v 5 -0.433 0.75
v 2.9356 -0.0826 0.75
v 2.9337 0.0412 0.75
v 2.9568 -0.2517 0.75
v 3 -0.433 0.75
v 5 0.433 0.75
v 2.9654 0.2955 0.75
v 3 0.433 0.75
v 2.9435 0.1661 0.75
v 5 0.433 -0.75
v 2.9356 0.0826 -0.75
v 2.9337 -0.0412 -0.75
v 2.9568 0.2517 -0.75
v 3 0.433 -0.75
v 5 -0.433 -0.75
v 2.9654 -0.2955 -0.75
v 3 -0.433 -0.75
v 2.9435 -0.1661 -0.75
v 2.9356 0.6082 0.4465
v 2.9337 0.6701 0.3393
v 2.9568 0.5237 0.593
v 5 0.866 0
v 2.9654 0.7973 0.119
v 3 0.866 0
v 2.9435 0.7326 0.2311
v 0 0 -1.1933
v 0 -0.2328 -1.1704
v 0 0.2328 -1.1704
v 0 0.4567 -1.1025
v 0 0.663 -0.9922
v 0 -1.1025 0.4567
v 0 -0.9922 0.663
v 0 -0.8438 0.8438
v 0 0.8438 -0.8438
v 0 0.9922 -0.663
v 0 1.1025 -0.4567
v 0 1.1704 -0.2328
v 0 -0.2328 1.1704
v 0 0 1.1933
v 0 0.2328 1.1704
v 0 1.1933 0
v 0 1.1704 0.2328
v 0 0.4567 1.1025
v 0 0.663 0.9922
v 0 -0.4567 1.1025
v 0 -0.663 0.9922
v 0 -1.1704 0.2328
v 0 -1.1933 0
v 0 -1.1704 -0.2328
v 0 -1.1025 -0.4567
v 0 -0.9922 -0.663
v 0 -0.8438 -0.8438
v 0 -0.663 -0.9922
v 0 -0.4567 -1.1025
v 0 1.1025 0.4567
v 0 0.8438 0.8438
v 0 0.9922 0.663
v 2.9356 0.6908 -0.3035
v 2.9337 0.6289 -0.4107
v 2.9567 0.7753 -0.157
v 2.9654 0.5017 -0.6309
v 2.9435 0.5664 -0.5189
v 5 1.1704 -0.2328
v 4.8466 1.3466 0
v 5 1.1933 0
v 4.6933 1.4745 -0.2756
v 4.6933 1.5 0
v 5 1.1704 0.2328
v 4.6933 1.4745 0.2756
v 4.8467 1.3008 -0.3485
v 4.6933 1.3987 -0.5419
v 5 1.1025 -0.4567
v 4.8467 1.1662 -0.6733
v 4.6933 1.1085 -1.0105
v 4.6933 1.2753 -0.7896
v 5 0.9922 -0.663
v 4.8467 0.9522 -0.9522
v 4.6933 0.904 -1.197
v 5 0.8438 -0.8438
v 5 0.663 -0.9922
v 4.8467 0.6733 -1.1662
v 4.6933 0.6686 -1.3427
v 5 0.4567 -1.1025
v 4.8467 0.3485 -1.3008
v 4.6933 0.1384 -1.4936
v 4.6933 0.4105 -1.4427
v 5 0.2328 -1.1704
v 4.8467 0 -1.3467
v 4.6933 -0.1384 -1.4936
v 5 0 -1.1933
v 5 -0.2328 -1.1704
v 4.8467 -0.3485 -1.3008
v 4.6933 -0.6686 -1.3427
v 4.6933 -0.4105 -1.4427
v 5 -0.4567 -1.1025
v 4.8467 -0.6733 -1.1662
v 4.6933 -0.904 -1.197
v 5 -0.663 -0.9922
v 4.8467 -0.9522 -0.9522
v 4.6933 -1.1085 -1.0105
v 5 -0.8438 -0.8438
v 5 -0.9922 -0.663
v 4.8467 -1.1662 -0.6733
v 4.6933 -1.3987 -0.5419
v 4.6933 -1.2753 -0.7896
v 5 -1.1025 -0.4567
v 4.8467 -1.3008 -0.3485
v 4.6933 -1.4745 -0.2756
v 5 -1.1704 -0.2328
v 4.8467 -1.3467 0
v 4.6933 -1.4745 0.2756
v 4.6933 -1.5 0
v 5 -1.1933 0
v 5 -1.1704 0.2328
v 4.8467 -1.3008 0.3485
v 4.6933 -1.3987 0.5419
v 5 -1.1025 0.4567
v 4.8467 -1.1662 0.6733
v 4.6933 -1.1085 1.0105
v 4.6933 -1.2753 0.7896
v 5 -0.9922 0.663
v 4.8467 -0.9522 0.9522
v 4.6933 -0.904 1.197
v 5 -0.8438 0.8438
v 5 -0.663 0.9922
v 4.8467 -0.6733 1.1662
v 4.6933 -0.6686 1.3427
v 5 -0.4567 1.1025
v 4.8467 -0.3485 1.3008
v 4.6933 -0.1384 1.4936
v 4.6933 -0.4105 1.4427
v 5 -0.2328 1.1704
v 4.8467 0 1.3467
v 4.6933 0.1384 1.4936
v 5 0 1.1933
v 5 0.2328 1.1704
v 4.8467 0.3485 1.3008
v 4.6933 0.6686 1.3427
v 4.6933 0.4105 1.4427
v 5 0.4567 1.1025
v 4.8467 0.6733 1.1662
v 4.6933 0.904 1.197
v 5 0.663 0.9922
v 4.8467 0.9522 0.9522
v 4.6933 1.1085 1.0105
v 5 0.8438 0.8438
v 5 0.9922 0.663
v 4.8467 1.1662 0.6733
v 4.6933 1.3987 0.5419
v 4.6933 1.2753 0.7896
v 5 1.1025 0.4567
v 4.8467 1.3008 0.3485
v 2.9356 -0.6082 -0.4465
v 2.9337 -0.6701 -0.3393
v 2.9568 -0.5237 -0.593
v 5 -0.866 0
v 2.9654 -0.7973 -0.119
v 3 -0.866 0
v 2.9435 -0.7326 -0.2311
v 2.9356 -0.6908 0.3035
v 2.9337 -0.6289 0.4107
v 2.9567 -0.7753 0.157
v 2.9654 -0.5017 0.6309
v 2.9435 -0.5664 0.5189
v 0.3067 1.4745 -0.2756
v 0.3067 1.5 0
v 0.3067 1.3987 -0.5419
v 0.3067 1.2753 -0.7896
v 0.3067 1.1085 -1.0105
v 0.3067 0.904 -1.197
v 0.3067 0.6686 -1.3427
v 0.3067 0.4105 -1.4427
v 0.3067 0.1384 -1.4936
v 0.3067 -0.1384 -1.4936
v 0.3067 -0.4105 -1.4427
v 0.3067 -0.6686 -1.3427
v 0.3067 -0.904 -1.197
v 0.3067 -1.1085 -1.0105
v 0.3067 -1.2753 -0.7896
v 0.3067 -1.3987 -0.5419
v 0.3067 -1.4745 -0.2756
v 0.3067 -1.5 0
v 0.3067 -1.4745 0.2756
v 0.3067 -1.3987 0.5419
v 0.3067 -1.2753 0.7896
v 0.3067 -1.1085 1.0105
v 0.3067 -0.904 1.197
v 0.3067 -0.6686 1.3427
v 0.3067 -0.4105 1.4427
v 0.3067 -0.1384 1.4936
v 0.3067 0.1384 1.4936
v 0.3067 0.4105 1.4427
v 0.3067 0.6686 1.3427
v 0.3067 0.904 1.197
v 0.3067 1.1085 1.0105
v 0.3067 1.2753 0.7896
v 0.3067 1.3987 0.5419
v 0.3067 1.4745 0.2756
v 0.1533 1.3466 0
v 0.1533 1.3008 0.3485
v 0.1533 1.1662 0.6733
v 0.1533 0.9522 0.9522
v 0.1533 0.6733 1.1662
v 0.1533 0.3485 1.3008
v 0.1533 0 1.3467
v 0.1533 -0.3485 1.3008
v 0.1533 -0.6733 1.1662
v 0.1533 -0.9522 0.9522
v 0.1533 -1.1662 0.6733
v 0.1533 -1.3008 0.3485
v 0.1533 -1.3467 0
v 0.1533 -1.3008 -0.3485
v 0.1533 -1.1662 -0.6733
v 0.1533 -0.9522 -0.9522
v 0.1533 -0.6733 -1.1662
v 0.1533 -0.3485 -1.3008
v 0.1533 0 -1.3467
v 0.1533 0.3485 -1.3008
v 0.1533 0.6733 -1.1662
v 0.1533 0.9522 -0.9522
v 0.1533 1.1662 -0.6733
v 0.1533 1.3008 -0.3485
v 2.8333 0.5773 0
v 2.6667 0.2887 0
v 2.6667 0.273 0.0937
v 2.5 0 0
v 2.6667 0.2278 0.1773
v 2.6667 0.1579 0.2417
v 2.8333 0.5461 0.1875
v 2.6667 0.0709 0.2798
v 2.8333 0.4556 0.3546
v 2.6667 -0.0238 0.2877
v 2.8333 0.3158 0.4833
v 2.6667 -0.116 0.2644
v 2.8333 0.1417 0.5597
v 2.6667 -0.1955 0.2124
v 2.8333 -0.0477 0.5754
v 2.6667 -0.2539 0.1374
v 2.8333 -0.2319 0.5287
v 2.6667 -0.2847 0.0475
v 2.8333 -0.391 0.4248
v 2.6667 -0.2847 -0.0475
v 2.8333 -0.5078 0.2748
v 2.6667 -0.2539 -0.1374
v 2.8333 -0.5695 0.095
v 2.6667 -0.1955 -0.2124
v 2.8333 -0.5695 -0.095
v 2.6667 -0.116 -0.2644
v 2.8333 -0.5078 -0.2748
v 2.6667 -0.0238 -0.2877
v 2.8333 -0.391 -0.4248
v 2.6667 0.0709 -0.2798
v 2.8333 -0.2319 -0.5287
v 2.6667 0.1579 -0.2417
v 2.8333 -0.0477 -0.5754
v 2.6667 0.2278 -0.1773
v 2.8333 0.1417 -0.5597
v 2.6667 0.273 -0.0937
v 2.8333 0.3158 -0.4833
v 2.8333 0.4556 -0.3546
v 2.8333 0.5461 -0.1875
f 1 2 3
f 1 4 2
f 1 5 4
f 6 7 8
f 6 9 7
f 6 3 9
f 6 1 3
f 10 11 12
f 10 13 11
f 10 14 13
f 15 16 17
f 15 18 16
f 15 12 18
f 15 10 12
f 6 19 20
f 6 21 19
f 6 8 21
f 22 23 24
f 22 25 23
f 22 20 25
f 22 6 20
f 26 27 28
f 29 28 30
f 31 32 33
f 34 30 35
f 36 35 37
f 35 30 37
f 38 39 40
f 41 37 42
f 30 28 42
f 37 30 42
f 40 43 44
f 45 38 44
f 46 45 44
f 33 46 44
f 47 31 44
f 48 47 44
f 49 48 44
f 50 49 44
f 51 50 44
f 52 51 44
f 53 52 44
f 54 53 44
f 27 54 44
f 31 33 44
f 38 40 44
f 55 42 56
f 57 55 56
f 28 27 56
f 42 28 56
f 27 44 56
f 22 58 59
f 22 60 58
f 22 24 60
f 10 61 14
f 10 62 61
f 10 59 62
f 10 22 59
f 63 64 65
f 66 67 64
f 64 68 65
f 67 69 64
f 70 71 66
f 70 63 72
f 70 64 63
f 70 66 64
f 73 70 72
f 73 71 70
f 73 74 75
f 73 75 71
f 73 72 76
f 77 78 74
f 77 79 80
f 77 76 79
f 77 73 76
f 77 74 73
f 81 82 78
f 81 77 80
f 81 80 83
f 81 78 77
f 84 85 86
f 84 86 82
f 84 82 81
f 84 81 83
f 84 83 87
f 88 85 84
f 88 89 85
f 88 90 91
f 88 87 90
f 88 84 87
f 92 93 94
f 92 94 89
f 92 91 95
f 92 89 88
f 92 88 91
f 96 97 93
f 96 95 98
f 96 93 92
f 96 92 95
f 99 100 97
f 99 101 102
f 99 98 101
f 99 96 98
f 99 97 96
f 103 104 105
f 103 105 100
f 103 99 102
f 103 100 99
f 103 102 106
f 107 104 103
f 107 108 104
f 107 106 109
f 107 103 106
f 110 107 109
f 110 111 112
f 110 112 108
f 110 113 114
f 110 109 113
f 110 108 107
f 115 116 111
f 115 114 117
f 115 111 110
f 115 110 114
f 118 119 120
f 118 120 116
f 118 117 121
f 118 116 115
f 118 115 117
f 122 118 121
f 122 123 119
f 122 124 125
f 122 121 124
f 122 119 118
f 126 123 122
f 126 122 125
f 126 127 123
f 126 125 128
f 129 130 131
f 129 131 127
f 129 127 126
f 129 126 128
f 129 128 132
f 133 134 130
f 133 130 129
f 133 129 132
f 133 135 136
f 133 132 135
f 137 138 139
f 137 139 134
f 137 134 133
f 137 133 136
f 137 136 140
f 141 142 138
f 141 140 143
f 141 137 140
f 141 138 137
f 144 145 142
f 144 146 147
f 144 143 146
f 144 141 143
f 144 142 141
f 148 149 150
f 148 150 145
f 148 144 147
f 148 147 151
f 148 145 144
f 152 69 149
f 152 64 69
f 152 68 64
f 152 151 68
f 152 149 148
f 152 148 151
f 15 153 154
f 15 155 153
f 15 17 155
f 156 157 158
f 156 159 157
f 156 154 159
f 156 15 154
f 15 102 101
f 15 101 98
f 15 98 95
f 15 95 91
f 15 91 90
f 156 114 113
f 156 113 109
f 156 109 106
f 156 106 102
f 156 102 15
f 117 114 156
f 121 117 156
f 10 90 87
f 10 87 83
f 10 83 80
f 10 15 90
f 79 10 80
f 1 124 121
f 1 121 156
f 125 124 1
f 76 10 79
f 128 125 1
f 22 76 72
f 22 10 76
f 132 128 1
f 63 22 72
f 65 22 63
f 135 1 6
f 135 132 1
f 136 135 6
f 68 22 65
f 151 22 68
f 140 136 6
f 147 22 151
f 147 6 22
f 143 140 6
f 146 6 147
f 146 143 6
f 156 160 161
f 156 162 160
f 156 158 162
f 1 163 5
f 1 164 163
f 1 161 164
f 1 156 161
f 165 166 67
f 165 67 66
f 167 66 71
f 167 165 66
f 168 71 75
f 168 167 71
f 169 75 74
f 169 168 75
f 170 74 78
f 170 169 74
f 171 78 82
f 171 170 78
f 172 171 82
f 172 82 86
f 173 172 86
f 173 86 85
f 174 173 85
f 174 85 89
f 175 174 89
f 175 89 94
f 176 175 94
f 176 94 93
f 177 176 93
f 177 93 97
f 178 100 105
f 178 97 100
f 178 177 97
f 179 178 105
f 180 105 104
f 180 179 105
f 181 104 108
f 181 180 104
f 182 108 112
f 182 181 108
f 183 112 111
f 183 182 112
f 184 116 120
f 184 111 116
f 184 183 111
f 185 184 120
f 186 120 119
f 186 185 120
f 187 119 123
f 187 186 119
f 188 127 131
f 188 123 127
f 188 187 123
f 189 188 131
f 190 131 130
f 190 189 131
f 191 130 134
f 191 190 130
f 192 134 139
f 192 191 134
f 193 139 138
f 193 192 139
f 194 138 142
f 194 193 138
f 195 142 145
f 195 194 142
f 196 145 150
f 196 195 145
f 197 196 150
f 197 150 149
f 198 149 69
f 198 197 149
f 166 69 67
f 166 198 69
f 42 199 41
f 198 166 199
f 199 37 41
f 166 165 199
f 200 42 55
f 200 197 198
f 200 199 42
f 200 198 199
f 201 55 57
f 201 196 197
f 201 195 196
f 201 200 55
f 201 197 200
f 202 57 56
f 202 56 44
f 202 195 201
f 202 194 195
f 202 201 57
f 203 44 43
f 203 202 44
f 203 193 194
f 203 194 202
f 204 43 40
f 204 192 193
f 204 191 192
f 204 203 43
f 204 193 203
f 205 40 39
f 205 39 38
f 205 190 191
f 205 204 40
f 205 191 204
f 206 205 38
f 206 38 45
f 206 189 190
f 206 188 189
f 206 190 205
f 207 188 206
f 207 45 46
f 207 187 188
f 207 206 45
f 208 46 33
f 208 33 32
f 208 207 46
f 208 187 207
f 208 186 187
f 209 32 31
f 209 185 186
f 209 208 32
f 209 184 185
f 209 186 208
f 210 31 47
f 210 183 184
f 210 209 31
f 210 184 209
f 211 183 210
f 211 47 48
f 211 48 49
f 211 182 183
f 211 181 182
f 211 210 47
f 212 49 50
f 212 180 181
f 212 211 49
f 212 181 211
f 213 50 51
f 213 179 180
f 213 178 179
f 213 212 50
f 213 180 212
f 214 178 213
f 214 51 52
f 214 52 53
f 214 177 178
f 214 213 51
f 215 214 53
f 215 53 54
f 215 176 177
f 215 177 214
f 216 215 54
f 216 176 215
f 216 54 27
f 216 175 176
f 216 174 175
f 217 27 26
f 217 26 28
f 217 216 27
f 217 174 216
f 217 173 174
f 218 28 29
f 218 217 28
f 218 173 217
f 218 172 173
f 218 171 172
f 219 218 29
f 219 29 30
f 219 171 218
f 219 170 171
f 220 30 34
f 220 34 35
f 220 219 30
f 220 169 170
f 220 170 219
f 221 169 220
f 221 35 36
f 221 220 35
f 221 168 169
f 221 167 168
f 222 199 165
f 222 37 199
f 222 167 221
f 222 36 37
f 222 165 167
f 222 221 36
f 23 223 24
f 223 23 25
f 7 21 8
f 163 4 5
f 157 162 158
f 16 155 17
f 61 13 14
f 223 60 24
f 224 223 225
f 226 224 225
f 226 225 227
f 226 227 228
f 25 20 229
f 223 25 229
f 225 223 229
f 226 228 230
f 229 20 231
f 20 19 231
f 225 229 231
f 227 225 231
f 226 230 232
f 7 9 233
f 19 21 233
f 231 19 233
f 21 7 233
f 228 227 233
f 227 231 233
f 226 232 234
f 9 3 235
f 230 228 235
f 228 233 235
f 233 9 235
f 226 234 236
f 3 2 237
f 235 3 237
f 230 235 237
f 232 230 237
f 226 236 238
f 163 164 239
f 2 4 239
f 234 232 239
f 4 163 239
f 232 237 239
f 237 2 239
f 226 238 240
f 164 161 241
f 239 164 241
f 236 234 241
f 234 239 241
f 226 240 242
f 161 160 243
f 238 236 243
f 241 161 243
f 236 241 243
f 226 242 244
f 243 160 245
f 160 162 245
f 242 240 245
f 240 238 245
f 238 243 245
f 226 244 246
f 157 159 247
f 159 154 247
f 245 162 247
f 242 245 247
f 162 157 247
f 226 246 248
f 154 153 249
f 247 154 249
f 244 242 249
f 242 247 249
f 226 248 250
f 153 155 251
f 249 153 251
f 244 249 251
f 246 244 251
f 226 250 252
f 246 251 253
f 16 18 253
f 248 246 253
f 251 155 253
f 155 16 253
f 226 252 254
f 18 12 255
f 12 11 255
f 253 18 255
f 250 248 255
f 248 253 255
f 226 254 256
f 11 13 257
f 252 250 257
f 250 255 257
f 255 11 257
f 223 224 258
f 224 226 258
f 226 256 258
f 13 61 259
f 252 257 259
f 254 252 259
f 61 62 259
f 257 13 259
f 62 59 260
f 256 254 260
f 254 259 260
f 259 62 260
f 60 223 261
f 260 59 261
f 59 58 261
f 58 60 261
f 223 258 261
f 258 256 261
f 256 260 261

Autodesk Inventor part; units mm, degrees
ref_plane "YZ Plane" through (0, 0, 0) normal (1, 0, 0) x (0, 1, 0)
ref_plane "XZ Plane" through (0, 0, 0) normal (0, 1, 0) x (-1, 0, 0)
sketch "Эскиз1" plane through (0, 0, 0) normal (0, 0, 1) x (1, 0, 0)
  line L0 (0, 0) -> (2.5, 0)
  line L1 (5, 0.866) -> (5, 1.5)
  line L2 (5, 1.5) -> (0, 1.5)
  line L3 (5, 0.866) -> (3, 0.866)
  line L4 (3, 0.866) -> (2.5, 0)
  line L5 (0, -0.3) -> (0, 1.8) projected
  line L6 (0, 1.5) -> (0, 0)
  dimension "d0" = 2
  dimension "d1" = 60
  dimension "d2" = 3
  dimension "d3" = 1.7321
  dimension "d5" = 5
revolve "Базовый элемент" add sketch "Эскиз1" angle 360 about axis through (0, 0, 0) along (1, 0, 0)
sketch "Эскиз2" plane through (5, 0, 0) normal (1, 0, 0) x (0, 1, 0)
  circle A0 centre (0, 0) radius 0.866 projected
  line L0 (-0.433, 0.75) -> (0.433, 0.75)
  line L1 (0.433, 0.75) -> (0.866, 0)
  line L2 (0.866, 0) -> (0.433, -0.75)
  line L3 (0.433, -0.75) -> (-0.433, -0.75)
  line L4 (-0.433, -0.75) -> (-0.866, 0)
  line L5 (-0.866, 0) -> (-0.433, 0.75)
  point P0 (0, 0)
  point P1 (0, 0)
extrude "Паз" add sketch "Эскиз2" against normal up to next contours L1 A0 | A0 L2 | L0 A0 | A0 L3 | L5 A0 | A0 L4
thread "Резьба" size "M3x0.5" class "6g" standard "ISO Metric profile" length 5
chamfer "Фаска1" distance 0.3067 angle 45 1 edges at (5, -1.5, 0) measured on face at (3.3333, 1.4951, -0.1207)
chamfer "Фаска2" distance 0.3067 angle 45 1 edges at (0, -1.5, 0) measured on face at (1.5644, 1.4951, -0.1207)
ref_plane "Work Plane1" through (2.5, 0, 0) normal (0, 0, 1) x (1, 0, 0)
equation "\"d8\" = NLG"
equation "\"d10\" = -0.5 * GD1 + 0.5 * NND"
equation "\"d11\" = FAWI"
equation "\"d34\" = -0.5 * GD1 + 0.5 * NND"
equation "\"d12\" = -0.5 * GD1 + 0.5 * NND"
equation "\"d13\" = FAWI"
equation "\"d35\" = -0.5 * GD1 + 0.5 * NND"
equation "\"d0\" = INTI"
equation "\"d2\" = NND"
equation "\"d3\" = 1.1547 * SW"
equation "\"d5\" = NLG"
equation "\"NND\" = 3"
equation "\"NLG\" = 5"
equation "\"INTI\" = 2"
equation "\"FAWI\" = 45deg"
equation "\"SW\" = 1.5"
equation "\"GD1\" = THREADDIA - 1.2269 * PTC"
equation "\"SPD\" = 2"
equation "\"GUL\" = 0.61345 * PTC"
equation "\"TOA\" = 30deg"
equation "\"THREADDIA\" = 3"
equation "\"PTC\" = 0.5"
equation "\"FAWI1\" = 45deg"
equation "\"GAL\" = 0.61345 * PTC"
equation "\"E0\" = 1.155 * SW"
properties part number "DIN 913 - M3 x 5" material "Сталь, мягкая"
